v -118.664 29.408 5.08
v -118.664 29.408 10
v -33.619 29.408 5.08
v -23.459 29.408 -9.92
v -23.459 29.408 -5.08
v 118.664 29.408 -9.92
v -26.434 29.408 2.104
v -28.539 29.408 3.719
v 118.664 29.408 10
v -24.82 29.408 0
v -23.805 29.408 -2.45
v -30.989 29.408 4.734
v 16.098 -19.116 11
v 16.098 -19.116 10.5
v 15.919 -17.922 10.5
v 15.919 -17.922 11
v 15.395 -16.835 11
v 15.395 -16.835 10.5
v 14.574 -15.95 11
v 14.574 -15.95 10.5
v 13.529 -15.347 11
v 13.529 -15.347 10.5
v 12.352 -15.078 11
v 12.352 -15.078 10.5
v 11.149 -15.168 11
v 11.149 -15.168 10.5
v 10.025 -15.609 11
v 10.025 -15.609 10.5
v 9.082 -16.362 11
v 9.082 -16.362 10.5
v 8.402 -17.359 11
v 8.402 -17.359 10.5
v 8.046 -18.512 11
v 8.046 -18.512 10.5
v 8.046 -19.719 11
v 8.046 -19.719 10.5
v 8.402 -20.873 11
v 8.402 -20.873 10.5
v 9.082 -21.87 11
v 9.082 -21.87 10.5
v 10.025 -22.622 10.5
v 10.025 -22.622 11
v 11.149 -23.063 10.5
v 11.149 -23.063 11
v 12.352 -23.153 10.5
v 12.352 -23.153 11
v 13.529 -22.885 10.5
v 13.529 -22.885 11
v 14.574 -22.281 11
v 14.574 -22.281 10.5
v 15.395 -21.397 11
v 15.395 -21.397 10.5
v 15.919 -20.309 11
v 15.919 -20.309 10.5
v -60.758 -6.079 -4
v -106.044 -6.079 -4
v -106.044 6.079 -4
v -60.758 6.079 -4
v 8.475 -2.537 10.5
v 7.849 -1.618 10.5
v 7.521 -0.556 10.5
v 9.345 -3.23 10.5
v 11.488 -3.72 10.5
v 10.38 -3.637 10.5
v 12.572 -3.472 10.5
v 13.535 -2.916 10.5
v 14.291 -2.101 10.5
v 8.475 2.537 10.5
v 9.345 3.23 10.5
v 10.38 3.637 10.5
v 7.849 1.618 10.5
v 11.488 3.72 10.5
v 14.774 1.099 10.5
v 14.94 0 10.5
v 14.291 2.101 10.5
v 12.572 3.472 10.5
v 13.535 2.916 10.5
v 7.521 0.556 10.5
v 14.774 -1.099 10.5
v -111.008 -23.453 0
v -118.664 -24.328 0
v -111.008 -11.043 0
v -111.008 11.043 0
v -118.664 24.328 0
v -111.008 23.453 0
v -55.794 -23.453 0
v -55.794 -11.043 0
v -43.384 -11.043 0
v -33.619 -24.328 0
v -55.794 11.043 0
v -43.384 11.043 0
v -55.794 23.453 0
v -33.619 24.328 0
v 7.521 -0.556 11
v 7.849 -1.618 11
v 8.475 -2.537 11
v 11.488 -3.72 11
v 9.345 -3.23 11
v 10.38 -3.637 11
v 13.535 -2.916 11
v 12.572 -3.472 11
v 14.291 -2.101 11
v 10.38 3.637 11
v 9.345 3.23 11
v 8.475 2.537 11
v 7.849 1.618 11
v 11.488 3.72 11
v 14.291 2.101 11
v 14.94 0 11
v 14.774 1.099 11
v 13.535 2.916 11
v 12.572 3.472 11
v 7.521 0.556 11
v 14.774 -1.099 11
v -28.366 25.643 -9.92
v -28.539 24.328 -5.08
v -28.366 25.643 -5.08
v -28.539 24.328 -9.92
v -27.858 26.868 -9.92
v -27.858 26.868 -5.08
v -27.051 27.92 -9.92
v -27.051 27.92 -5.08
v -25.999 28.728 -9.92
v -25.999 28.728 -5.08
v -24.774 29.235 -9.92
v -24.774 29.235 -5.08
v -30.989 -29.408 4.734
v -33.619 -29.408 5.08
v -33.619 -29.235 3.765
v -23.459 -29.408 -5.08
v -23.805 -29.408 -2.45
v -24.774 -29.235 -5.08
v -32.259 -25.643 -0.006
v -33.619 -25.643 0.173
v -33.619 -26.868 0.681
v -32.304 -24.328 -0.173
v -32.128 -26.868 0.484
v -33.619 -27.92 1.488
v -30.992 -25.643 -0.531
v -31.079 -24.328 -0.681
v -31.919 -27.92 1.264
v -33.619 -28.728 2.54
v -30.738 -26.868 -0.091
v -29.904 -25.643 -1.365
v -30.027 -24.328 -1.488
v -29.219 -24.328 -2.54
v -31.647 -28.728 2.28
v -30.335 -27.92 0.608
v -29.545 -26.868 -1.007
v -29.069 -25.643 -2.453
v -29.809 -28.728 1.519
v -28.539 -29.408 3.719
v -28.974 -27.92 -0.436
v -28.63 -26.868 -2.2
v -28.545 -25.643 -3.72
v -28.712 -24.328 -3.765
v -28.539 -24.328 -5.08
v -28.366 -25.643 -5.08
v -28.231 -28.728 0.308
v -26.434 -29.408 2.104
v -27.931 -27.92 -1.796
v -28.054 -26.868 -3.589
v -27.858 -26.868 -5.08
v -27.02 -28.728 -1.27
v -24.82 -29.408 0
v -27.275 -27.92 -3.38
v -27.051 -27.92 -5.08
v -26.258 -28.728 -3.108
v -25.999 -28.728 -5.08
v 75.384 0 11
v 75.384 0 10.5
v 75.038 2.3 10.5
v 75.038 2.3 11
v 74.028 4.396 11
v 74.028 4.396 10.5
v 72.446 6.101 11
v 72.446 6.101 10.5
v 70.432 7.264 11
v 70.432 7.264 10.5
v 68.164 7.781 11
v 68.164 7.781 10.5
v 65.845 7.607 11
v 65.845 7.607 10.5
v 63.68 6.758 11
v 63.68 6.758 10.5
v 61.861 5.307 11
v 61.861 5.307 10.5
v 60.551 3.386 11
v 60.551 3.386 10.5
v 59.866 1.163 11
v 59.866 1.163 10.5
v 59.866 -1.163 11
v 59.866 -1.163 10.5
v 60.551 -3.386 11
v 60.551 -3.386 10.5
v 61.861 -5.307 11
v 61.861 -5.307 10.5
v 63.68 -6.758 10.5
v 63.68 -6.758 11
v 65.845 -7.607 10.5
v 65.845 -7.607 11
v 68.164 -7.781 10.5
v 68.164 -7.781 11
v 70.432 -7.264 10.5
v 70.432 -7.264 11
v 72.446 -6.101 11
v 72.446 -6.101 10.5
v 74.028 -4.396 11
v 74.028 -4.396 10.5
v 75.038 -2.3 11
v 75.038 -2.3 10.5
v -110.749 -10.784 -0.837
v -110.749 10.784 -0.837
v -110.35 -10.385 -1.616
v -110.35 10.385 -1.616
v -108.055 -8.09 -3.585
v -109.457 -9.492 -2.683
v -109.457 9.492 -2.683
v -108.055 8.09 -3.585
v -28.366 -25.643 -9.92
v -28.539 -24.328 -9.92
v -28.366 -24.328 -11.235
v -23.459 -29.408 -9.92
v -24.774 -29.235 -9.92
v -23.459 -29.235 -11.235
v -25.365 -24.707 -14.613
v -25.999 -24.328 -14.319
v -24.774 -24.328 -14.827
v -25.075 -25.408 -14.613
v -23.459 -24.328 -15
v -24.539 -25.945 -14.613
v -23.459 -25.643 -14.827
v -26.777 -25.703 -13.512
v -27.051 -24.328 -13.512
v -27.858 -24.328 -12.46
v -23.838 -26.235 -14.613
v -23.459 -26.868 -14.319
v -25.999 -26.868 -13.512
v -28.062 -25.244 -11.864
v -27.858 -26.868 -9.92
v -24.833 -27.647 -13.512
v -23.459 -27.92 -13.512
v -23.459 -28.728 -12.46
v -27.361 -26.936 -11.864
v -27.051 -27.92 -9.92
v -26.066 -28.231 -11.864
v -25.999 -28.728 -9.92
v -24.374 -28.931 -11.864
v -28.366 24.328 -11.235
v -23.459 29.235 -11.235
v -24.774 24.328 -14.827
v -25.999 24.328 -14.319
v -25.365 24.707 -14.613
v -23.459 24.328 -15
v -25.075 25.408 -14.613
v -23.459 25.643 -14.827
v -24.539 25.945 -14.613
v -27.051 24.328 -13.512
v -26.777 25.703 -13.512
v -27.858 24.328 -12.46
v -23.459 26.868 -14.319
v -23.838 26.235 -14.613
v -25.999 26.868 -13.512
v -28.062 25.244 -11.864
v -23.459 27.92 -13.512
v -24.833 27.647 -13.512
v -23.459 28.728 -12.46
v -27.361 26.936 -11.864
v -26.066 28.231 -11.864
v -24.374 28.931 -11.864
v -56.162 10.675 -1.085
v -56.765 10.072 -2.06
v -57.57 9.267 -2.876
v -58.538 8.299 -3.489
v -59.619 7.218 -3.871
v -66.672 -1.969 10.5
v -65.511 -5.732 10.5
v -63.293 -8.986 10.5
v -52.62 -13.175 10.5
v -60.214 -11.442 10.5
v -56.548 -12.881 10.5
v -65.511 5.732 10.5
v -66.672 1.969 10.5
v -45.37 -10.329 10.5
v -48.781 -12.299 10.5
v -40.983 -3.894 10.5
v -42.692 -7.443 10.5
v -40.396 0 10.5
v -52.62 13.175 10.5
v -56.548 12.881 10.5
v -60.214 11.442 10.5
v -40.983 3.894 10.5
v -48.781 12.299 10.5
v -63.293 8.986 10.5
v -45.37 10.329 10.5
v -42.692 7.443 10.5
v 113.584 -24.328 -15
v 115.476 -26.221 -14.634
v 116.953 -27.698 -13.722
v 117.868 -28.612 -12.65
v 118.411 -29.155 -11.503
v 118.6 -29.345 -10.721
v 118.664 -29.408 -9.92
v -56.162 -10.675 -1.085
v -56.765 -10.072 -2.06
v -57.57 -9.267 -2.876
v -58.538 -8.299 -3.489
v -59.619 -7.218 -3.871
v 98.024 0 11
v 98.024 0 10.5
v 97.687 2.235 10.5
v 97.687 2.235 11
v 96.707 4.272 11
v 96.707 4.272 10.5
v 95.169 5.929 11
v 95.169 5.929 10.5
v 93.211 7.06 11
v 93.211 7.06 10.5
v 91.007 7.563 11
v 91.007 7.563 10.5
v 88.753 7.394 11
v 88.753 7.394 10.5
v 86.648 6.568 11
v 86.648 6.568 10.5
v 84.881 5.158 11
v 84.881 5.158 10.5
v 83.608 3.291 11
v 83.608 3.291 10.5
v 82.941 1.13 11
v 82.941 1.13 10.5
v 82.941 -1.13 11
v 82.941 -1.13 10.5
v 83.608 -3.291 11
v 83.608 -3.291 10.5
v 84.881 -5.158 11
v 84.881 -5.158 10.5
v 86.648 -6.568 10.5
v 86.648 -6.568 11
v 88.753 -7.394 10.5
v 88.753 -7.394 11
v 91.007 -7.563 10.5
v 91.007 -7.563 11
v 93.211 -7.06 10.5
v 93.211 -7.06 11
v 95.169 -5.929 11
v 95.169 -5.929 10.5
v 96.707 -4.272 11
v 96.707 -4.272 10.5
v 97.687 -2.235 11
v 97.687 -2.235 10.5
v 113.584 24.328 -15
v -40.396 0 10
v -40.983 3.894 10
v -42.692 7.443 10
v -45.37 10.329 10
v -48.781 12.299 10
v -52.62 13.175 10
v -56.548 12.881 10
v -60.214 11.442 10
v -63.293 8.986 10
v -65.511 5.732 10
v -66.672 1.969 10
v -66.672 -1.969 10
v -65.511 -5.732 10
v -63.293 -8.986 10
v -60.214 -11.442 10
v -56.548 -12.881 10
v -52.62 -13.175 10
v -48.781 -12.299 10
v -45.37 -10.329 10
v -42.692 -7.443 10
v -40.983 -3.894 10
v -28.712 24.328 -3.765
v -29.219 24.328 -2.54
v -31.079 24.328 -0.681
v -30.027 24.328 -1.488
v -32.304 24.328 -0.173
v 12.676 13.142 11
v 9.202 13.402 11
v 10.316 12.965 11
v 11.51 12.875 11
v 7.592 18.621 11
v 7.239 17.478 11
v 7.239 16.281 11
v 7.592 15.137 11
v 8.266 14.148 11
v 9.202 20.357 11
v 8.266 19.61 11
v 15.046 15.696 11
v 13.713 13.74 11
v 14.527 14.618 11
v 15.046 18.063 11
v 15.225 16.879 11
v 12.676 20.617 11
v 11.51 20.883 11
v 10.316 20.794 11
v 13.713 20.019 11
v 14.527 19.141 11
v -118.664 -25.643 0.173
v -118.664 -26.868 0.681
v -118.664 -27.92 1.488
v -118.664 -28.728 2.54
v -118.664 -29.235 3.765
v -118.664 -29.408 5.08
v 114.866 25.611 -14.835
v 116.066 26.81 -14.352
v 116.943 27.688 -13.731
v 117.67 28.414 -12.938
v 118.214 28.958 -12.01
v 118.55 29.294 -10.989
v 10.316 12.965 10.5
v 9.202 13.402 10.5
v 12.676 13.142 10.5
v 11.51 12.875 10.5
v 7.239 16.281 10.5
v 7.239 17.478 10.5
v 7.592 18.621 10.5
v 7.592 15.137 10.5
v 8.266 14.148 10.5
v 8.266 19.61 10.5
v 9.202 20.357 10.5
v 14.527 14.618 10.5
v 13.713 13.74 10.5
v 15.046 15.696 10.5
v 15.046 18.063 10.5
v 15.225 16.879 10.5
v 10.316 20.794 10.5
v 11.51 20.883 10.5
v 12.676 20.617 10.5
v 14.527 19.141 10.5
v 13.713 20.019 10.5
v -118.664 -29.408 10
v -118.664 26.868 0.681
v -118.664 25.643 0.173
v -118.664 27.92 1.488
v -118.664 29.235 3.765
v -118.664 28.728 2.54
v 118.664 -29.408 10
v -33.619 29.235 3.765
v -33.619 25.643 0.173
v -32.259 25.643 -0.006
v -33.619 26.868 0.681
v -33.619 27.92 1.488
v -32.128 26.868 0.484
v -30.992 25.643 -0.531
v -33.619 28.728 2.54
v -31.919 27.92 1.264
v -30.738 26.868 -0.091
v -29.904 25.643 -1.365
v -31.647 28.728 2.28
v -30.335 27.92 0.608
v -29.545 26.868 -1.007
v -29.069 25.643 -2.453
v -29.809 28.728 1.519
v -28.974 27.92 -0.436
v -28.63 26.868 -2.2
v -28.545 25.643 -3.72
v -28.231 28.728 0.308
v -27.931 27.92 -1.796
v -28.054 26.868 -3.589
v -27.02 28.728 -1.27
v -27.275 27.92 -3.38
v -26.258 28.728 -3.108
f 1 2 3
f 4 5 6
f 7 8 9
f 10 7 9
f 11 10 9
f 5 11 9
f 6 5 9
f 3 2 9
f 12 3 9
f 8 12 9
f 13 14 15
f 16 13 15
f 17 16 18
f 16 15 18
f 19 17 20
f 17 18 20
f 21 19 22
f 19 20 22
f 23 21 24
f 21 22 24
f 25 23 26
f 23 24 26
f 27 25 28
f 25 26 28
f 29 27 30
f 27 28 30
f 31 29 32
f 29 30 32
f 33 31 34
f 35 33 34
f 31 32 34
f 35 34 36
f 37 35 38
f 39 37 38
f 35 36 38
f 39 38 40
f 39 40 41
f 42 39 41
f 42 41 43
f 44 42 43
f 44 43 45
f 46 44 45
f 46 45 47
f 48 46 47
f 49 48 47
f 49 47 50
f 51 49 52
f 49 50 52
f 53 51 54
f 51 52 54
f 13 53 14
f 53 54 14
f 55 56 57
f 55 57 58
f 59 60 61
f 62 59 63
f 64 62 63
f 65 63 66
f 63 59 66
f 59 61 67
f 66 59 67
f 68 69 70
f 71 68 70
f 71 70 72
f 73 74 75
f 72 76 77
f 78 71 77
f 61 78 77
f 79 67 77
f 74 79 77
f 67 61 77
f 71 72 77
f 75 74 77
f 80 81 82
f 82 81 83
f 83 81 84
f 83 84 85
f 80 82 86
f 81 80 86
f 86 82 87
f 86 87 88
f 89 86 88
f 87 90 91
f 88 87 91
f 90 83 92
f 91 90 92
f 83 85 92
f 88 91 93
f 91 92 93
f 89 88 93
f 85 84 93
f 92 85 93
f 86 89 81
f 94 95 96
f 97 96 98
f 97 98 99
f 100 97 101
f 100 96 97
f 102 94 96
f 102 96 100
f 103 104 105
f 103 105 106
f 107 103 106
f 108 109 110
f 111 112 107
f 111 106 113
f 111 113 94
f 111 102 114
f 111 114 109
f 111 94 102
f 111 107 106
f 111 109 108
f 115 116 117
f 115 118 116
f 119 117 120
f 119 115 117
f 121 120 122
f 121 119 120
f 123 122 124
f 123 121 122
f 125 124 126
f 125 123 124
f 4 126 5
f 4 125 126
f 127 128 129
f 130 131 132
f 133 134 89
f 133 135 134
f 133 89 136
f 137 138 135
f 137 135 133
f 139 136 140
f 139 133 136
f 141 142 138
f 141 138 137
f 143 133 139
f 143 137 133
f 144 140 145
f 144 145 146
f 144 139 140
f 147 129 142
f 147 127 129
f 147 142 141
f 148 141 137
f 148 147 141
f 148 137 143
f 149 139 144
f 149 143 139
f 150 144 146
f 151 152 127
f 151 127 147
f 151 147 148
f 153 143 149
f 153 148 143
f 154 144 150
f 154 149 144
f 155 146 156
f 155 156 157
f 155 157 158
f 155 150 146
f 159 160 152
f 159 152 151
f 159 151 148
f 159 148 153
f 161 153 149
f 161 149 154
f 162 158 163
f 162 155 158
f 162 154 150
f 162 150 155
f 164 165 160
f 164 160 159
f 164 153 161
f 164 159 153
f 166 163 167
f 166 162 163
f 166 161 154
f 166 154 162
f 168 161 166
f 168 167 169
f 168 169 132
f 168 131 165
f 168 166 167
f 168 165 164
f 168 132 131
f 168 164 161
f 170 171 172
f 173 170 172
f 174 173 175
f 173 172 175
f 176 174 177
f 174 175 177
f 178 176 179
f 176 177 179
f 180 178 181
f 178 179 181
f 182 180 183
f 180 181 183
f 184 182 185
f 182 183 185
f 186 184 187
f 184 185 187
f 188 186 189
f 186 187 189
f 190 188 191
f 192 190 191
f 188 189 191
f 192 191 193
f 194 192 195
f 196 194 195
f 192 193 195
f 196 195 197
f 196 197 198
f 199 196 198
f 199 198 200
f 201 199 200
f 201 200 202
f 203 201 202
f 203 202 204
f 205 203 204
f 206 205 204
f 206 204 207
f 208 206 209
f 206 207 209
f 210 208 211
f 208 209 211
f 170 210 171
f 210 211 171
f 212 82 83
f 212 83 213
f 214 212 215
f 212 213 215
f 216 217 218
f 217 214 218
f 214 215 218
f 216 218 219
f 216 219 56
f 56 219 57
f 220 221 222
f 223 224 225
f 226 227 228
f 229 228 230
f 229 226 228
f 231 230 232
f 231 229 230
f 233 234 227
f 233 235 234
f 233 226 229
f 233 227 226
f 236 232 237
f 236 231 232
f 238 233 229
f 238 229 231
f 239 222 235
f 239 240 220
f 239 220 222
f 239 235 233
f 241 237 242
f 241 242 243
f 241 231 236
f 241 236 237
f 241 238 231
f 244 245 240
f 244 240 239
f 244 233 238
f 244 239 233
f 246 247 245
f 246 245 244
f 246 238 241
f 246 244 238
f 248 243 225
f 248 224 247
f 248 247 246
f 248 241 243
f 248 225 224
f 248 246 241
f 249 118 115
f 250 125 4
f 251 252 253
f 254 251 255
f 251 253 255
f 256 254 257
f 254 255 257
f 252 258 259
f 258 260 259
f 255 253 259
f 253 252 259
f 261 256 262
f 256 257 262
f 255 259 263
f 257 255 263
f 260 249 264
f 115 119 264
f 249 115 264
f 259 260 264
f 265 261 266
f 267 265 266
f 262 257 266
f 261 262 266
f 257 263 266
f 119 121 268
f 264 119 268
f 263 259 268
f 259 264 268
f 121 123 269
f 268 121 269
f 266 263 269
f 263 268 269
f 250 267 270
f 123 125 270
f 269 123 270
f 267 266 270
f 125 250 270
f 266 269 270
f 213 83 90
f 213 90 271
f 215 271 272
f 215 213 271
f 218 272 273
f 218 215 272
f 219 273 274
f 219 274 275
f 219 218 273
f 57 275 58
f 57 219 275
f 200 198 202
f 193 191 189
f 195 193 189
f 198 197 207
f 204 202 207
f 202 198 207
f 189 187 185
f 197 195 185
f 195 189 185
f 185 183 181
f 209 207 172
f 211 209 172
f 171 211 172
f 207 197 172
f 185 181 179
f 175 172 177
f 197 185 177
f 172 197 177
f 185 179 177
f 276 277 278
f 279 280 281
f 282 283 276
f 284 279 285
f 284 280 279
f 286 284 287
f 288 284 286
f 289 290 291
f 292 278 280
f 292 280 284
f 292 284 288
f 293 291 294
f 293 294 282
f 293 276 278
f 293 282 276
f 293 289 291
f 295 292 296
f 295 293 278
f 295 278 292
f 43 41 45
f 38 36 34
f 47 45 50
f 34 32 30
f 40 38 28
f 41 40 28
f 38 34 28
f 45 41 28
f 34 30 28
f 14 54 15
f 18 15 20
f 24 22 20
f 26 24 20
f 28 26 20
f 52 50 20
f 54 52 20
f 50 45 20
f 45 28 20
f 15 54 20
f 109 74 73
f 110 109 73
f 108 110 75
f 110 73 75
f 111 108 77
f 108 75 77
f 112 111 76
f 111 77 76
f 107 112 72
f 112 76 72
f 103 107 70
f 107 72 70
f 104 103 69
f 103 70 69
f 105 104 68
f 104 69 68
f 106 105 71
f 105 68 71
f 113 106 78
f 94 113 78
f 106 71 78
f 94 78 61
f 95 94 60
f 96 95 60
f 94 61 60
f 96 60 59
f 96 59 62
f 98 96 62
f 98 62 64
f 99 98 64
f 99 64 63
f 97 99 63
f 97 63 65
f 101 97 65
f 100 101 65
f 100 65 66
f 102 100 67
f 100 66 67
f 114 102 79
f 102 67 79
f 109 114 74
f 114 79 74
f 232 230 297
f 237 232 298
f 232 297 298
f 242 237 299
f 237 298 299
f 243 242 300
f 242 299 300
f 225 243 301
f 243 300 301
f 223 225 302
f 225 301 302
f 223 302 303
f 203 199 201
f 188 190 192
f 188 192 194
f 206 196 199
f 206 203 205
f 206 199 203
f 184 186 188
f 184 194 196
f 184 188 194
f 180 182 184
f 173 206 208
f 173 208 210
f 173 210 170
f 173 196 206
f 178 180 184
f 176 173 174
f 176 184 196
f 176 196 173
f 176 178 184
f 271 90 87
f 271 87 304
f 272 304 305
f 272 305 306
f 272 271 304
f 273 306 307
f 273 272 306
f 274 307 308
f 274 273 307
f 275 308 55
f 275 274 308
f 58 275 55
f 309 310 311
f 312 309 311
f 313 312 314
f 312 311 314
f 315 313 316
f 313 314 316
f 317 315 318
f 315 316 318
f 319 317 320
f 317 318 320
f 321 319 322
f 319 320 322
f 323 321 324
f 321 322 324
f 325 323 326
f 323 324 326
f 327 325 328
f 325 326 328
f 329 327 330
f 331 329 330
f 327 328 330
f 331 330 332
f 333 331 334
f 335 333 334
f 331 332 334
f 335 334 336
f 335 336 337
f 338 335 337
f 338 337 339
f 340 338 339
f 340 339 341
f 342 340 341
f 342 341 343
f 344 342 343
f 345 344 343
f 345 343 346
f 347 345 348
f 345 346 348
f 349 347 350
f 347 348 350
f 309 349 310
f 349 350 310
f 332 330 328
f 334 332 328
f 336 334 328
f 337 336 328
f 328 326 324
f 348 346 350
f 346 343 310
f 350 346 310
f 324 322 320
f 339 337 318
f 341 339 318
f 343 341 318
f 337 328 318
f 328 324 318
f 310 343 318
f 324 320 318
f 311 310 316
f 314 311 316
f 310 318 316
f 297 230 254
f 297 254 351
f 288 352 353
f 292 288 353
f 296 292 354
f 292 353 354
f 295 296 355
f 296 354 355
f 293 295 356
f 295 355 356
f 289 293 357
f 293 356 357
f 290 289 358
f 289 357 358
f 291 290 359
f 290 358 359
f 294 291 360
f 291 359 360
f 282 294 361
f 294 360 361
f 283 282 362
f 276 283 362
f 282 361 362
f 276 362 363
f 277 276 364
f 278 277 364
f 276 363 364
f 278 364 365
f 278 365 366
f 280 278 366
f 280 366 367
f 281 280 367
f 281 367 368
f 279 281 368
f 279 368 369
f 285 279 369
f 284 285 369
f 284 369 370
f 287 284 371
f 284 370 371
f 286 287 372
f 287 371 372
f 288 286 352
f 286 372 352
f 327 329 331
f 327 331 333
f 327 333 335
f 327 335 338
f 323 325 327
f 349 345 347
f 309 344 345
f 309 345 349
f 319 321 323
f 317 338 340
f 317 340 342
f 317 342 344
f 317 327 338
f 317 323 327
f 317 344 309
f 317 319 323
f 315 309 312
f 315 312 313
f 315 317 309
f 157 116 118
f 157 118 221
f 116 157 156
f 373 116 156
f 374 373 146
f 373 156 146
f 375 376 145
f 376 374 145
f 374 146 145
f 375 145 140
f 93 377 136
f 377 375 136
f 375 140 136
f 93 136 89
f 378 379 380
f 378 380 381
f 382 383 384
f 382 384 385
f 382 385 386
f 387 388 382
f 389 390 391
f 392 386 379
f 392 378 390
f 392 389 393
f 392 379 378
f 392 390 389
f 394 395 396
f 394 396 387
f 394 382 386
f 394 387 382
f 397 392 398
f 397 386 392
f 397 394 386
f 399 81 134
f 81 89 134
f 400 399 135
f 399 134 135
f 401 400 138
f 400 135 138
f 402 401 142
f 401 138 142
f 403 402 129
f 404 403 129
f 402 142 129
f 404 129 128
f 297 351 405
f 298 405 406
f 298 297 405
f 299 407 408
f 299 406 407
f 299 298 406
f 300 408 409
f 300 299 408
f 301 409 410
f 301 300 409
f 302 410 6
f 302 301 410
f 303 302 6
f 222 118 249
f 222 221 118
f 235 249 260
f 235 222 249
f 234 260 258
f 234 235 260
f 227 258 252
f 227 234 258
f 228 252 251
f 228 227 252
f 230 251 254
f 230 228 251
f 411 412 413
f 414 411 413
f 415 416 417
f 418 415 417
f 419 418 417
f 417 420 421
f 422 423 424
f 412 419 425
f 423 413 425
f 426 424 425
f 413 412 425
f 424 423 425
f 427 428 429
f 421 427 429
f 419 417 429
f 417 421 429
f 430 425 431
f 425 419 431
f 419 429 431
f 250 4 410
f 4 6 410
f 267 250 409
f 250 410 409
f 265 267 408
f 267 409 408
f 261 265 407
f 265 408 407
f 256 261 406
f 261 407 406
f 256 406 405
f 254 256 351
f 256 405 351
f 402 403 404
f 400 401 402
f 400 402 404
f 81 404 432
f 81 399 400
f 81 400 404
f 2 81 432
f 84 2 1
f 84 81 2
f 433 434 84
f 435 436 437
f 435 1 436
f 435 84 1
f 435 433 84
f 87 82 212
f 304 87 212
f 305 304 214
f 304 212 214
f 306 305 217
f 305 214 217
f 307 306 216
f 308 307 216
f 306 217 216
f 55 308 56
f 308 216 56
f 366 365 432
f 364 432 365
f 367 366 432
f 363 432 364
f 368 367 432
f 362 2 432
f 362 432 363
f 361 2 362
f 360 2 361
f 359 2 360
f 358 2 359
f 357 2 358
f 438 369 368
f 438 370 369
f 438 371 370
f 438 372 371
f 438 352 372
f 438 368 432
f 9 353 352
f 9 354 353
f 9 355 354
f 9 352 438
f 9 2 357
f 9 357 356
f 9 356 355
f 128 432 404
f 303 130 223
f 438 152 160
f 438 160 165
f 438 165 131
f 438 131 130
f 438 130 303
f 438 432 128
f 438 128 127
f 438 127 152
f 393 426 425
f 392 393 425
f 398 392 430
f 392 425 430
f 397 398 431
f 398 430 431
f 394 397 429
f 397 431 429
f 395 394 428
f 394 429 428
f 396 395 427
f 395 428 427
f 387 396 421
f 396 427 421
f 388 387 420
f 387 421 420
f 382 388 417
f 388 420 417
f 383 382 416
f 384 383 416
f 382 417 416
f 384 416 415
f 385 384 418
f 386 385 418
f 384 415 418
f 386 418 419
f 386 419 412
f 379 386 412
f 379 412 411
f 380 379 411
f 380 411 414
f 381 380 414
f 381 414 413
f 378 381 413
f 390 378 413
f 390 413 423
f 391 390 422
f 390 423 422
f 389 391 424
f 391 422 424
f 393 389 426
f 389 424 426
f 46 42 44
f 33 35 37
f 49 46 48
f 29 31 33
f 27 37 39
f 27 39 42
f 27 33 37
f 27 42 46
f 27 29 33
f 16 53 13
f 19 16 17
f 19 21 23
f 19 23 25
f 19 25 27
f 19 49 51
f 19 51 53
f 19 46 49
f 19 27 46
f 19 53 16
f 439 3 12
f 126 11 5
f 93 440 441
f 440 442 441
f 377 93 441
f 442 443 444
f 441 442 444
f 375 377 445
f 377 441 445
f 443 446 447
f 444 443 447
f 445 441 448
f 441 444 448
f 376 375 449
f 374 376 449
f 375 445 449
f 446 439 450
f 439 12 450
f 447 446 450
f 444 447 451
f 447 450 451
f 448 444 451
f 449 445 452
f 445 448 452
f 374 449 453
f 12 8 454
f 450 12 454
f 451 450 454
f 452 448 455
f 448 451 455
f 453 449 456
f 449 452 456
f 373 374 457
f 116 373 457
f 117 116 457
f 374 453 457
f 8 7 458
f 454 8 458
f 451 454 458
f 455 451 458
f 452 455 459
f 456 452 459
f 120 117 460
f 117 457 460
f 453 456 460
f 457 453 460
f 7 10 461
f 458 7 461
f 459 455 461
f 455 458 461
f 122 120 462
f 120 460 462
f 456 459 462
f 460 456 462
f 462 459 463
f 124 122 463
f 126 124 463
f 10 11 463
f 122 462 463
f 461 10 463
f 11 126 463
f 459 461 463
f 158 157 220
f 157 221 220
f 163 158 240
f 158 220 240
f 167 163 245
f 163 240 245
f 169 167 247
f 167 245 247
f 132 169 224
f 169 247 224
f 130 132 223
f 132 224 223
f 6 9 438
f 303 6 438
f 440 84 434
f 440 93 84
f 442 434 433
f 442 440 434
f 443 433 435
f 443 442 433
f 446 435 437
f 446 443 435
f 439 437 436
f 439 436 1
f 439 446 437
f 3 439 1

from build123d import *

# Parameters (mm, degrees)
F0_W        = 237.3272180557
F0_H        = 58.8164292276
F1_DEPTH    = 10
F2_W        = 147.2023129463
F2_H        = 58.8164292276
F3_DEPTH    = 15
F4_F1_R     = 5.08
F4_F2_R     = 5.08
F5_W        = 55.2143082023
F5_H        = 22.0865048468
F6_DEPTH    = 4
F7_T1_DEPTH = 46.9058521388
F7_T3_DEPTH = 80.0336554942
F9_R        = 13.2118644906
F10_DEPTH   = 0.5
F11_R       = 4.0488978151
F12_DEPTH   = 0.5
F11_R_2     = 3.7300649458
F11_R_3     = 4.0152102199
F11_R_4     = 7.8029945449
F11_R_5     = 7.5839402098


# Not quite as in the source:
# - a fillet or chamfer that OpenCascade refuses, or shapes differently, is made with other operations: its cross-section is extruded or revolved along the edge and cut away or added


with BuildPart() as f1:
    # F0 (on Top) → F1 (new body)
    with BuildSketch(Plane.XY):
        Rectangle(F0_W, F0_H)
    extrude(amount=F1_DEPTH)

    # F2 (on face) → F3 (join)
    with BuildSketch(Plane(origin=(0, 0, 0), x_dir=(1, 0, 0), z_dir=(0, 0, -1))):
        with Locations((45.0624525547, 0)):
            Rectangle(F2_W, F2_H)
    extrude(amount=F3_DEPTH)

    # F4: fillet of radius 5.08 on 7 edges, made by hand

    # F4_f1
    f4_f1_edges = [f1.edges().sort_by_distance(p)[0] for p in [
        (-28.5387039185, 0, 0),
    ]]
    fillet(f4_f1_edges, radius=F4_F1_R)

    # F4_f2
    f4_f2_edges = [f1.edges().sort_by_distance(p)[0] for p in [
        (-28.5387039185, -29.4082146138, -10.04),
        (-28.5387039185, 29.4082146138, -10.04),
        (-28.5387039185, 0, -15),
        (45.0624525547, 29.4082146138, -15),
        (118.6636090279, 0, -15),
        (45.0624525547, -29.4082146138, -15),
        (-30.02660147, 29.4082146138, -1.4878975516),
        (-30.02660147, -29.4082146138, -1.4878975516),
    ]]
    fillet(f4_f2_edges, radius=F4_F2_R)

    # F5 (on face) → F6 (join)
    with BuildSketch(Plane(origin=(0, 0, 0), x_dir=(1, 0, 0), z_dir=(0, 0, -1))):
        with Locations((-83.400927484, 0)):
            Rectangle(F5_W, F5_H)
    extrude(amount=F6_DEPTH)

    # F7: fillet of radius 5.08 on 4 edges, made by hand

    # F7_s2 → F7_t1 (cut)
    with BuildSketch(Plane.XZ.offset(-23.4529260694)):
        with BuildLine():
            ThreePointArc((-55.7937733829, 0), (-57.5701673512, -2.8755530587), (-60.7576428413, -4))
            Line((-60.7576428413, -4), (-55.7937733829, -4))
            Line((-55.7937733829, -4), (-55.7937733829, 0))
        make_face()
        with BuildLine():
            ThreePointArc((-111.0080815852, 0), (-109.2316876169, -2.8755530587), (-106.0442121268, -4))
            Line((-106.0442121268, -4), (-111.0080815852, -4))
            Line((-111.0080815852, -4), (-111.0080815852, 0))
        make_face()
    extrude(amount=F7_T1_DEPTH, mode=Mode.SUBTRACT)

    # F7_s4 → F7_t3 (cut)
    with BuildSketch(Plane.YZ.offset(-123.4177552312)):
        with BuildLine():
            ThreePointArc((-11.0432524234, 0), (-9.2668584551, -2.8755530587), (-6.079382965, -4))
            Line((-6.079382965, -4), (-11.0432524234, -4))
            Line((-11.0432524234, -4), (-11.0432524234, 0))
        make_face()
        with BuildLine():
            ThreePointArc((11.0432524234, 0), (9.2668584551, -2.8755530587), (6.079382965, -4))
            Line((6.079382965, -4), (11.0432524234, -4))
            Line((11.0432524234, -4), (11.0432524234, 0))
        make_face()
    extrude(amount=F7_T3_DEPTH, mode=Mode.SUBTRACT)

    # F9 (on face) → F10 (join)
    with BuildSketch(Plane.XY.offset(10)):
        with Locations((-53.6077320576, 0)):
            Circle(F9_R)
    extrude(amount=F10_DEPTH)


with BuildPart() as f12:
    # F11 (on face) → F12 (new body)
    with BuildSketch(Plane.XY.offset(10.5)):
        with Locations((12.0495855808, -19.1157609224)):
            Circle(F11_R)
    extrude(amount=F12_DEPTH)


with BuildPart() as f12b:
    # F11 (on face) → F12, piece 2 (new body)
    with BuildSketch(Plane.XY.offset(10.5)):
        with Locations((11.2095503137, 0)):
            Circle(F11_R_2)
    extrude(amount=F12_DEPTH)


with BuildPart() as f12c:
    # F11 (on face) → F12, piece 3 (new body)
    with BuildSketch(Plane.XY.offset(10.5)):
        with Locations((11.2095503137, 16.8793648481)):
            Circle(F11_R_3)
    extrude(amount=F12_DEPTH)


with BuildPart() as f12d:
    # F11 (on face) → F12, piece 4 (new body)
    with BuildSketch(Plane.XY.offset(10.5)):
        with Locations((67.5813481212, 0)):
            Circle(F11_R_4)
    extrude(amount=F12_DEPTH)


with BuildPart() as f12e:
    # F11 (on face) → F12, piece 5 (new body)
    with BuildSketch(Plane.XY.offset(10.5)):
        with Locations((90.4404297471, 0)):
            Circle(F11_R_5)
    extrude(amount=F12_DEPTH)


solid = Compound([f1.part, f12.part, f12b.part, f12c.part, f12d.part, f12e.part])
